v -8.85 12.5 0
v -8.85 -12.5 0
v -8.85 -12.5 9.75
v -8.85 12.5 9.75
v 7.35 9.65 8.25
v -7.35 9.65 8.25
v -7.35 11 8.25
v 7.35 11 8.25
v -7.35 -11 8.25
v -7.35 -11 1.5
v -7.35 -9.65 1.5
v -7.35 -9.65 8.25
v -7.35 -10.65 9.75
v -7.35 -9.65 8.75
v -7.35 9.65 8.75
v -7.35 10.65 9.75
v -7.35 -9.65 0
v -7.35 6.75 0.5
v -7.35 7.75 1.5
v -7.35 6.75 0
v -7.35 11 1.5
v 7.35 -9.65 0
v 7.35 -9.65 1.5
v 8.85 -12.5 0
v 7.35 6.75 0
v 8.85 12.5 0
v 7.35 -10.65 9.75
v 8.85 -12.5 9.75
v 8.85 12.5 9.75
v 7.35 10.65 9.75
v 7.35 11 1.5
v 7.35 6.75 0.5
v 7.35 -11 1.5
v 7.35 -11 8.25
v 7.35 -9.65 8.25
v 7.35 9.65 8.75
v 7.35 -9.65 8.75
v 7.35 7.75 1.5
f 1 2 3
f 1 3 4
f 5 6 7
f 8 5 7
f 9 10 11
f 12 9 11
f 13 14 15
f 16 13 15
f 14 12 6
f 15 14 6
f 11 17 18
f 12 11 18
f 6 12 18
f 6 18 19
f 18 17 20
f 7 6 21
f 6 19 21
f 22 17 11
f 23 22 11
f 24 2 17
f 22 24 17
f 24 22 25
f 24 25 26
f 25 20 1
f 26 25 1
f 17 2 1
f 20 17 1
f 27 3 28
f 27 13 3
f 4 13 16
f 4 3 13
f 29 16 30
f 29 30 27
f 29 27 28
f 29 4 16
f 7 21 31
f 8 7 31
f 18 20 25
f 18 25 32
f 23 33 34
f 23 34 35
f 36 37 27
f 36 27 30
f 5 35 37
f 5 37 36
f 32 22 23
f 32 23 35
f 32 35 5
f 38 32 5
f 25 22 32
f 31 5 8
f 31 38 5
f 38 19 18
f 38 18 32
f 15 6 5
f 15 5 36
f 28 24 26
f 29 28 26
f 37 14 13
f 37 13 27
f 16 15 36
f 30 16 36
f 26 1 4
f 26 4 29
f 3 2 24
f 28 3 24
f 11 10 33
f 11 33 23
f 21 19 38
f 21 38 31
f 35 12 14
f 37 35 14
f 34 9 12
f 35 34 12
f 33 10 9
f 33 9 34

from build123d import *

# Parameters (mm, degrees)
SKETCH013_W   = 17.7
SKETCH013_H   = 25
SKETCH013_W_2 = 14.7
SKETCH013_H_2 = 22
PAD001_DEPTH  = 9.75
SKETCH014_W   = 1.35
SKETCH014_H   = 1.5
SKETCH014_W_2 = 4.25
PAD002_DEPTH  = 14.7
CHAMFER_SIZE  = 1


with BuildPart() as part:
    # Sketch013 → Pad001 (new body)
    with BuildSketch(Plane.XY):
        Rectangle(SKETCH013_W, SKETCH013_H)
        Rectangle(SKETCH013_W_2, SKETCH013_H_2, mode=Mode.SUBTRACT)
    extrude(amount=PAD001_DEPTH)

    # Sketch014 (on Face7 of Pad001) → Pad002 (join)
    with BuildSketch(Plane.YZ.offset(-7.35)):
        with Locations((-10.325, 0.75)):
            Rectangle(SKETCH014_W, SKETCH014_H)
        with Locations((-10.325, 9)):
            Rectangle(SKETCH014_W, SKETCH014_H)
        with Locations((10.325, 9)):
            Rectangle(SKETCH014_W, SKETCH014_H)
        with Locations((8.875, 0.75)):
            Rectangle(SKETCH014_W_2, SKETCH014_H)
    extrude(amount=PAD002_DEPTH)

    # Chamfer
    chamfer_edges = [part.edges().sort_by_distance(p)[0] for p in [
        (0, -9.65, 9.75),
        (0, 9.65, 9.75),
        (0, 6.75, 1.5),
    ]]
    chamfer(chamfer_edges, length=CHAMFER_SIZE)


solid = part.part
